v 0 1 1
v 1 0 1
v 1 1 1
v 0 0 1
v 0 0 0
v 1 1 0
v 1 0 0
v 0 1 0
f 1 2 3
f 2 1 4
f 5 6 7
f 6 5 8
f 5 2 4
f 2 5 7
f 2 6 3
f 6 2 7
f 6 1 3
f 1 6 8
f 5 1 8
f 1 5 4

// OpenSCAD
cube(1);
echo(1 == 1);
echo(1 == 2);
echo(1 == "1");
echo(1 == "2");
echo("1" == 1);
echo("1" == 2);
echo("12" == "12");

echo(1 == true);
echo(0 == true);
echo("a" == true);

echo(true == 1);
echo(true == 0);
echo(true == "a");

echo(true == true);
echo(true == false);
echo(false == true);

echo([1] == [1]);
echo([1,2] == [1,2]);
echo([1,[2,3]] == [1,[2,3]]);
echo([1] == [2]);
echo([1,[2,3]] == [1,[2,4]]);


echo(1 == [1]);
echo(true == [1]);
echo("1" == [1]);

echo([1] == 1);
echo([1] == true);
echo([1] == "1");

echo(1+4 == 5);
